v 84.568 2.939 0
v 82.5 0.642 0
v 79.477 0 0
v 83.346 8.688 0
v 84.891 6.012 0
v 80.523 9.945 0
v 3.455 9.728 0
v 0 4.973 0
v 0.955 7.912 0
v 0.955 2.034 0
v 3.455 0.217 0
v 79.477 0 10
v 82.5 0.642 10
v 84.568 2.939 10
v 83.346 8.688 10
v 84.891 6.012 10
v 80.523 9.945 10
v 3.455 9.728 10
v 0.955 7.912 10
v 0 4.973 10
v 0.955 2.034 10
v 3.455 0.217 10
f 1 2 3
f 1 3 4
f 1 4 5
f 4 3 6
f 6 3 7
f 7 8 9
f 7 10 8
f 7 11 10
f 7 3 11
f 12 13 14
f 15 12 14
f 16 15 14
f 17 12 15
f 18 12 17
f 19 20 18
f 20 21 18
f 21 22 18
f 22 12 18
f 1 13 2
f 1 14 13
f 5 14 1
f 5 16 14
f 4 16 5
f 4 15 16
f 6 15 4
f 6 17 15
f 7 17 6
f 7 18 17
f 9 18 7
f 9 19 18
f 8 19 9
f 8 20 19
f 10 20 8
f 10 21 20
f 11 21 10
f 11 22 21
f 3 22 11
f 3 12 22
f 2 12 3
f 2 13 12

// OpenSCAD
$fn = 32;

// ----------------------------------------------------------------------
// Key bar: parallel key, 10 mm thick
// ----------------------------------------------------------------------

// --- parameters (mm) ---
profile_height = 10;      // extrusion height
profile_points = 11;      // points of the closed outline

profile = [[0, 4.973], [0.955, 2.034], [3.455, 0.217], [79.477, 0], [82.5, 0.642], [84.568, 2.939], [84.891, 6.012], [83.346, 8.688], [80.523, 9.945], [3.455, 9.728], [0.955, 7.912]];  // single closed polygon, 11 points, counter clockwise

// --- the one profile operation ---
linear_extrude(height = profile_height) polygon(points = profile);
